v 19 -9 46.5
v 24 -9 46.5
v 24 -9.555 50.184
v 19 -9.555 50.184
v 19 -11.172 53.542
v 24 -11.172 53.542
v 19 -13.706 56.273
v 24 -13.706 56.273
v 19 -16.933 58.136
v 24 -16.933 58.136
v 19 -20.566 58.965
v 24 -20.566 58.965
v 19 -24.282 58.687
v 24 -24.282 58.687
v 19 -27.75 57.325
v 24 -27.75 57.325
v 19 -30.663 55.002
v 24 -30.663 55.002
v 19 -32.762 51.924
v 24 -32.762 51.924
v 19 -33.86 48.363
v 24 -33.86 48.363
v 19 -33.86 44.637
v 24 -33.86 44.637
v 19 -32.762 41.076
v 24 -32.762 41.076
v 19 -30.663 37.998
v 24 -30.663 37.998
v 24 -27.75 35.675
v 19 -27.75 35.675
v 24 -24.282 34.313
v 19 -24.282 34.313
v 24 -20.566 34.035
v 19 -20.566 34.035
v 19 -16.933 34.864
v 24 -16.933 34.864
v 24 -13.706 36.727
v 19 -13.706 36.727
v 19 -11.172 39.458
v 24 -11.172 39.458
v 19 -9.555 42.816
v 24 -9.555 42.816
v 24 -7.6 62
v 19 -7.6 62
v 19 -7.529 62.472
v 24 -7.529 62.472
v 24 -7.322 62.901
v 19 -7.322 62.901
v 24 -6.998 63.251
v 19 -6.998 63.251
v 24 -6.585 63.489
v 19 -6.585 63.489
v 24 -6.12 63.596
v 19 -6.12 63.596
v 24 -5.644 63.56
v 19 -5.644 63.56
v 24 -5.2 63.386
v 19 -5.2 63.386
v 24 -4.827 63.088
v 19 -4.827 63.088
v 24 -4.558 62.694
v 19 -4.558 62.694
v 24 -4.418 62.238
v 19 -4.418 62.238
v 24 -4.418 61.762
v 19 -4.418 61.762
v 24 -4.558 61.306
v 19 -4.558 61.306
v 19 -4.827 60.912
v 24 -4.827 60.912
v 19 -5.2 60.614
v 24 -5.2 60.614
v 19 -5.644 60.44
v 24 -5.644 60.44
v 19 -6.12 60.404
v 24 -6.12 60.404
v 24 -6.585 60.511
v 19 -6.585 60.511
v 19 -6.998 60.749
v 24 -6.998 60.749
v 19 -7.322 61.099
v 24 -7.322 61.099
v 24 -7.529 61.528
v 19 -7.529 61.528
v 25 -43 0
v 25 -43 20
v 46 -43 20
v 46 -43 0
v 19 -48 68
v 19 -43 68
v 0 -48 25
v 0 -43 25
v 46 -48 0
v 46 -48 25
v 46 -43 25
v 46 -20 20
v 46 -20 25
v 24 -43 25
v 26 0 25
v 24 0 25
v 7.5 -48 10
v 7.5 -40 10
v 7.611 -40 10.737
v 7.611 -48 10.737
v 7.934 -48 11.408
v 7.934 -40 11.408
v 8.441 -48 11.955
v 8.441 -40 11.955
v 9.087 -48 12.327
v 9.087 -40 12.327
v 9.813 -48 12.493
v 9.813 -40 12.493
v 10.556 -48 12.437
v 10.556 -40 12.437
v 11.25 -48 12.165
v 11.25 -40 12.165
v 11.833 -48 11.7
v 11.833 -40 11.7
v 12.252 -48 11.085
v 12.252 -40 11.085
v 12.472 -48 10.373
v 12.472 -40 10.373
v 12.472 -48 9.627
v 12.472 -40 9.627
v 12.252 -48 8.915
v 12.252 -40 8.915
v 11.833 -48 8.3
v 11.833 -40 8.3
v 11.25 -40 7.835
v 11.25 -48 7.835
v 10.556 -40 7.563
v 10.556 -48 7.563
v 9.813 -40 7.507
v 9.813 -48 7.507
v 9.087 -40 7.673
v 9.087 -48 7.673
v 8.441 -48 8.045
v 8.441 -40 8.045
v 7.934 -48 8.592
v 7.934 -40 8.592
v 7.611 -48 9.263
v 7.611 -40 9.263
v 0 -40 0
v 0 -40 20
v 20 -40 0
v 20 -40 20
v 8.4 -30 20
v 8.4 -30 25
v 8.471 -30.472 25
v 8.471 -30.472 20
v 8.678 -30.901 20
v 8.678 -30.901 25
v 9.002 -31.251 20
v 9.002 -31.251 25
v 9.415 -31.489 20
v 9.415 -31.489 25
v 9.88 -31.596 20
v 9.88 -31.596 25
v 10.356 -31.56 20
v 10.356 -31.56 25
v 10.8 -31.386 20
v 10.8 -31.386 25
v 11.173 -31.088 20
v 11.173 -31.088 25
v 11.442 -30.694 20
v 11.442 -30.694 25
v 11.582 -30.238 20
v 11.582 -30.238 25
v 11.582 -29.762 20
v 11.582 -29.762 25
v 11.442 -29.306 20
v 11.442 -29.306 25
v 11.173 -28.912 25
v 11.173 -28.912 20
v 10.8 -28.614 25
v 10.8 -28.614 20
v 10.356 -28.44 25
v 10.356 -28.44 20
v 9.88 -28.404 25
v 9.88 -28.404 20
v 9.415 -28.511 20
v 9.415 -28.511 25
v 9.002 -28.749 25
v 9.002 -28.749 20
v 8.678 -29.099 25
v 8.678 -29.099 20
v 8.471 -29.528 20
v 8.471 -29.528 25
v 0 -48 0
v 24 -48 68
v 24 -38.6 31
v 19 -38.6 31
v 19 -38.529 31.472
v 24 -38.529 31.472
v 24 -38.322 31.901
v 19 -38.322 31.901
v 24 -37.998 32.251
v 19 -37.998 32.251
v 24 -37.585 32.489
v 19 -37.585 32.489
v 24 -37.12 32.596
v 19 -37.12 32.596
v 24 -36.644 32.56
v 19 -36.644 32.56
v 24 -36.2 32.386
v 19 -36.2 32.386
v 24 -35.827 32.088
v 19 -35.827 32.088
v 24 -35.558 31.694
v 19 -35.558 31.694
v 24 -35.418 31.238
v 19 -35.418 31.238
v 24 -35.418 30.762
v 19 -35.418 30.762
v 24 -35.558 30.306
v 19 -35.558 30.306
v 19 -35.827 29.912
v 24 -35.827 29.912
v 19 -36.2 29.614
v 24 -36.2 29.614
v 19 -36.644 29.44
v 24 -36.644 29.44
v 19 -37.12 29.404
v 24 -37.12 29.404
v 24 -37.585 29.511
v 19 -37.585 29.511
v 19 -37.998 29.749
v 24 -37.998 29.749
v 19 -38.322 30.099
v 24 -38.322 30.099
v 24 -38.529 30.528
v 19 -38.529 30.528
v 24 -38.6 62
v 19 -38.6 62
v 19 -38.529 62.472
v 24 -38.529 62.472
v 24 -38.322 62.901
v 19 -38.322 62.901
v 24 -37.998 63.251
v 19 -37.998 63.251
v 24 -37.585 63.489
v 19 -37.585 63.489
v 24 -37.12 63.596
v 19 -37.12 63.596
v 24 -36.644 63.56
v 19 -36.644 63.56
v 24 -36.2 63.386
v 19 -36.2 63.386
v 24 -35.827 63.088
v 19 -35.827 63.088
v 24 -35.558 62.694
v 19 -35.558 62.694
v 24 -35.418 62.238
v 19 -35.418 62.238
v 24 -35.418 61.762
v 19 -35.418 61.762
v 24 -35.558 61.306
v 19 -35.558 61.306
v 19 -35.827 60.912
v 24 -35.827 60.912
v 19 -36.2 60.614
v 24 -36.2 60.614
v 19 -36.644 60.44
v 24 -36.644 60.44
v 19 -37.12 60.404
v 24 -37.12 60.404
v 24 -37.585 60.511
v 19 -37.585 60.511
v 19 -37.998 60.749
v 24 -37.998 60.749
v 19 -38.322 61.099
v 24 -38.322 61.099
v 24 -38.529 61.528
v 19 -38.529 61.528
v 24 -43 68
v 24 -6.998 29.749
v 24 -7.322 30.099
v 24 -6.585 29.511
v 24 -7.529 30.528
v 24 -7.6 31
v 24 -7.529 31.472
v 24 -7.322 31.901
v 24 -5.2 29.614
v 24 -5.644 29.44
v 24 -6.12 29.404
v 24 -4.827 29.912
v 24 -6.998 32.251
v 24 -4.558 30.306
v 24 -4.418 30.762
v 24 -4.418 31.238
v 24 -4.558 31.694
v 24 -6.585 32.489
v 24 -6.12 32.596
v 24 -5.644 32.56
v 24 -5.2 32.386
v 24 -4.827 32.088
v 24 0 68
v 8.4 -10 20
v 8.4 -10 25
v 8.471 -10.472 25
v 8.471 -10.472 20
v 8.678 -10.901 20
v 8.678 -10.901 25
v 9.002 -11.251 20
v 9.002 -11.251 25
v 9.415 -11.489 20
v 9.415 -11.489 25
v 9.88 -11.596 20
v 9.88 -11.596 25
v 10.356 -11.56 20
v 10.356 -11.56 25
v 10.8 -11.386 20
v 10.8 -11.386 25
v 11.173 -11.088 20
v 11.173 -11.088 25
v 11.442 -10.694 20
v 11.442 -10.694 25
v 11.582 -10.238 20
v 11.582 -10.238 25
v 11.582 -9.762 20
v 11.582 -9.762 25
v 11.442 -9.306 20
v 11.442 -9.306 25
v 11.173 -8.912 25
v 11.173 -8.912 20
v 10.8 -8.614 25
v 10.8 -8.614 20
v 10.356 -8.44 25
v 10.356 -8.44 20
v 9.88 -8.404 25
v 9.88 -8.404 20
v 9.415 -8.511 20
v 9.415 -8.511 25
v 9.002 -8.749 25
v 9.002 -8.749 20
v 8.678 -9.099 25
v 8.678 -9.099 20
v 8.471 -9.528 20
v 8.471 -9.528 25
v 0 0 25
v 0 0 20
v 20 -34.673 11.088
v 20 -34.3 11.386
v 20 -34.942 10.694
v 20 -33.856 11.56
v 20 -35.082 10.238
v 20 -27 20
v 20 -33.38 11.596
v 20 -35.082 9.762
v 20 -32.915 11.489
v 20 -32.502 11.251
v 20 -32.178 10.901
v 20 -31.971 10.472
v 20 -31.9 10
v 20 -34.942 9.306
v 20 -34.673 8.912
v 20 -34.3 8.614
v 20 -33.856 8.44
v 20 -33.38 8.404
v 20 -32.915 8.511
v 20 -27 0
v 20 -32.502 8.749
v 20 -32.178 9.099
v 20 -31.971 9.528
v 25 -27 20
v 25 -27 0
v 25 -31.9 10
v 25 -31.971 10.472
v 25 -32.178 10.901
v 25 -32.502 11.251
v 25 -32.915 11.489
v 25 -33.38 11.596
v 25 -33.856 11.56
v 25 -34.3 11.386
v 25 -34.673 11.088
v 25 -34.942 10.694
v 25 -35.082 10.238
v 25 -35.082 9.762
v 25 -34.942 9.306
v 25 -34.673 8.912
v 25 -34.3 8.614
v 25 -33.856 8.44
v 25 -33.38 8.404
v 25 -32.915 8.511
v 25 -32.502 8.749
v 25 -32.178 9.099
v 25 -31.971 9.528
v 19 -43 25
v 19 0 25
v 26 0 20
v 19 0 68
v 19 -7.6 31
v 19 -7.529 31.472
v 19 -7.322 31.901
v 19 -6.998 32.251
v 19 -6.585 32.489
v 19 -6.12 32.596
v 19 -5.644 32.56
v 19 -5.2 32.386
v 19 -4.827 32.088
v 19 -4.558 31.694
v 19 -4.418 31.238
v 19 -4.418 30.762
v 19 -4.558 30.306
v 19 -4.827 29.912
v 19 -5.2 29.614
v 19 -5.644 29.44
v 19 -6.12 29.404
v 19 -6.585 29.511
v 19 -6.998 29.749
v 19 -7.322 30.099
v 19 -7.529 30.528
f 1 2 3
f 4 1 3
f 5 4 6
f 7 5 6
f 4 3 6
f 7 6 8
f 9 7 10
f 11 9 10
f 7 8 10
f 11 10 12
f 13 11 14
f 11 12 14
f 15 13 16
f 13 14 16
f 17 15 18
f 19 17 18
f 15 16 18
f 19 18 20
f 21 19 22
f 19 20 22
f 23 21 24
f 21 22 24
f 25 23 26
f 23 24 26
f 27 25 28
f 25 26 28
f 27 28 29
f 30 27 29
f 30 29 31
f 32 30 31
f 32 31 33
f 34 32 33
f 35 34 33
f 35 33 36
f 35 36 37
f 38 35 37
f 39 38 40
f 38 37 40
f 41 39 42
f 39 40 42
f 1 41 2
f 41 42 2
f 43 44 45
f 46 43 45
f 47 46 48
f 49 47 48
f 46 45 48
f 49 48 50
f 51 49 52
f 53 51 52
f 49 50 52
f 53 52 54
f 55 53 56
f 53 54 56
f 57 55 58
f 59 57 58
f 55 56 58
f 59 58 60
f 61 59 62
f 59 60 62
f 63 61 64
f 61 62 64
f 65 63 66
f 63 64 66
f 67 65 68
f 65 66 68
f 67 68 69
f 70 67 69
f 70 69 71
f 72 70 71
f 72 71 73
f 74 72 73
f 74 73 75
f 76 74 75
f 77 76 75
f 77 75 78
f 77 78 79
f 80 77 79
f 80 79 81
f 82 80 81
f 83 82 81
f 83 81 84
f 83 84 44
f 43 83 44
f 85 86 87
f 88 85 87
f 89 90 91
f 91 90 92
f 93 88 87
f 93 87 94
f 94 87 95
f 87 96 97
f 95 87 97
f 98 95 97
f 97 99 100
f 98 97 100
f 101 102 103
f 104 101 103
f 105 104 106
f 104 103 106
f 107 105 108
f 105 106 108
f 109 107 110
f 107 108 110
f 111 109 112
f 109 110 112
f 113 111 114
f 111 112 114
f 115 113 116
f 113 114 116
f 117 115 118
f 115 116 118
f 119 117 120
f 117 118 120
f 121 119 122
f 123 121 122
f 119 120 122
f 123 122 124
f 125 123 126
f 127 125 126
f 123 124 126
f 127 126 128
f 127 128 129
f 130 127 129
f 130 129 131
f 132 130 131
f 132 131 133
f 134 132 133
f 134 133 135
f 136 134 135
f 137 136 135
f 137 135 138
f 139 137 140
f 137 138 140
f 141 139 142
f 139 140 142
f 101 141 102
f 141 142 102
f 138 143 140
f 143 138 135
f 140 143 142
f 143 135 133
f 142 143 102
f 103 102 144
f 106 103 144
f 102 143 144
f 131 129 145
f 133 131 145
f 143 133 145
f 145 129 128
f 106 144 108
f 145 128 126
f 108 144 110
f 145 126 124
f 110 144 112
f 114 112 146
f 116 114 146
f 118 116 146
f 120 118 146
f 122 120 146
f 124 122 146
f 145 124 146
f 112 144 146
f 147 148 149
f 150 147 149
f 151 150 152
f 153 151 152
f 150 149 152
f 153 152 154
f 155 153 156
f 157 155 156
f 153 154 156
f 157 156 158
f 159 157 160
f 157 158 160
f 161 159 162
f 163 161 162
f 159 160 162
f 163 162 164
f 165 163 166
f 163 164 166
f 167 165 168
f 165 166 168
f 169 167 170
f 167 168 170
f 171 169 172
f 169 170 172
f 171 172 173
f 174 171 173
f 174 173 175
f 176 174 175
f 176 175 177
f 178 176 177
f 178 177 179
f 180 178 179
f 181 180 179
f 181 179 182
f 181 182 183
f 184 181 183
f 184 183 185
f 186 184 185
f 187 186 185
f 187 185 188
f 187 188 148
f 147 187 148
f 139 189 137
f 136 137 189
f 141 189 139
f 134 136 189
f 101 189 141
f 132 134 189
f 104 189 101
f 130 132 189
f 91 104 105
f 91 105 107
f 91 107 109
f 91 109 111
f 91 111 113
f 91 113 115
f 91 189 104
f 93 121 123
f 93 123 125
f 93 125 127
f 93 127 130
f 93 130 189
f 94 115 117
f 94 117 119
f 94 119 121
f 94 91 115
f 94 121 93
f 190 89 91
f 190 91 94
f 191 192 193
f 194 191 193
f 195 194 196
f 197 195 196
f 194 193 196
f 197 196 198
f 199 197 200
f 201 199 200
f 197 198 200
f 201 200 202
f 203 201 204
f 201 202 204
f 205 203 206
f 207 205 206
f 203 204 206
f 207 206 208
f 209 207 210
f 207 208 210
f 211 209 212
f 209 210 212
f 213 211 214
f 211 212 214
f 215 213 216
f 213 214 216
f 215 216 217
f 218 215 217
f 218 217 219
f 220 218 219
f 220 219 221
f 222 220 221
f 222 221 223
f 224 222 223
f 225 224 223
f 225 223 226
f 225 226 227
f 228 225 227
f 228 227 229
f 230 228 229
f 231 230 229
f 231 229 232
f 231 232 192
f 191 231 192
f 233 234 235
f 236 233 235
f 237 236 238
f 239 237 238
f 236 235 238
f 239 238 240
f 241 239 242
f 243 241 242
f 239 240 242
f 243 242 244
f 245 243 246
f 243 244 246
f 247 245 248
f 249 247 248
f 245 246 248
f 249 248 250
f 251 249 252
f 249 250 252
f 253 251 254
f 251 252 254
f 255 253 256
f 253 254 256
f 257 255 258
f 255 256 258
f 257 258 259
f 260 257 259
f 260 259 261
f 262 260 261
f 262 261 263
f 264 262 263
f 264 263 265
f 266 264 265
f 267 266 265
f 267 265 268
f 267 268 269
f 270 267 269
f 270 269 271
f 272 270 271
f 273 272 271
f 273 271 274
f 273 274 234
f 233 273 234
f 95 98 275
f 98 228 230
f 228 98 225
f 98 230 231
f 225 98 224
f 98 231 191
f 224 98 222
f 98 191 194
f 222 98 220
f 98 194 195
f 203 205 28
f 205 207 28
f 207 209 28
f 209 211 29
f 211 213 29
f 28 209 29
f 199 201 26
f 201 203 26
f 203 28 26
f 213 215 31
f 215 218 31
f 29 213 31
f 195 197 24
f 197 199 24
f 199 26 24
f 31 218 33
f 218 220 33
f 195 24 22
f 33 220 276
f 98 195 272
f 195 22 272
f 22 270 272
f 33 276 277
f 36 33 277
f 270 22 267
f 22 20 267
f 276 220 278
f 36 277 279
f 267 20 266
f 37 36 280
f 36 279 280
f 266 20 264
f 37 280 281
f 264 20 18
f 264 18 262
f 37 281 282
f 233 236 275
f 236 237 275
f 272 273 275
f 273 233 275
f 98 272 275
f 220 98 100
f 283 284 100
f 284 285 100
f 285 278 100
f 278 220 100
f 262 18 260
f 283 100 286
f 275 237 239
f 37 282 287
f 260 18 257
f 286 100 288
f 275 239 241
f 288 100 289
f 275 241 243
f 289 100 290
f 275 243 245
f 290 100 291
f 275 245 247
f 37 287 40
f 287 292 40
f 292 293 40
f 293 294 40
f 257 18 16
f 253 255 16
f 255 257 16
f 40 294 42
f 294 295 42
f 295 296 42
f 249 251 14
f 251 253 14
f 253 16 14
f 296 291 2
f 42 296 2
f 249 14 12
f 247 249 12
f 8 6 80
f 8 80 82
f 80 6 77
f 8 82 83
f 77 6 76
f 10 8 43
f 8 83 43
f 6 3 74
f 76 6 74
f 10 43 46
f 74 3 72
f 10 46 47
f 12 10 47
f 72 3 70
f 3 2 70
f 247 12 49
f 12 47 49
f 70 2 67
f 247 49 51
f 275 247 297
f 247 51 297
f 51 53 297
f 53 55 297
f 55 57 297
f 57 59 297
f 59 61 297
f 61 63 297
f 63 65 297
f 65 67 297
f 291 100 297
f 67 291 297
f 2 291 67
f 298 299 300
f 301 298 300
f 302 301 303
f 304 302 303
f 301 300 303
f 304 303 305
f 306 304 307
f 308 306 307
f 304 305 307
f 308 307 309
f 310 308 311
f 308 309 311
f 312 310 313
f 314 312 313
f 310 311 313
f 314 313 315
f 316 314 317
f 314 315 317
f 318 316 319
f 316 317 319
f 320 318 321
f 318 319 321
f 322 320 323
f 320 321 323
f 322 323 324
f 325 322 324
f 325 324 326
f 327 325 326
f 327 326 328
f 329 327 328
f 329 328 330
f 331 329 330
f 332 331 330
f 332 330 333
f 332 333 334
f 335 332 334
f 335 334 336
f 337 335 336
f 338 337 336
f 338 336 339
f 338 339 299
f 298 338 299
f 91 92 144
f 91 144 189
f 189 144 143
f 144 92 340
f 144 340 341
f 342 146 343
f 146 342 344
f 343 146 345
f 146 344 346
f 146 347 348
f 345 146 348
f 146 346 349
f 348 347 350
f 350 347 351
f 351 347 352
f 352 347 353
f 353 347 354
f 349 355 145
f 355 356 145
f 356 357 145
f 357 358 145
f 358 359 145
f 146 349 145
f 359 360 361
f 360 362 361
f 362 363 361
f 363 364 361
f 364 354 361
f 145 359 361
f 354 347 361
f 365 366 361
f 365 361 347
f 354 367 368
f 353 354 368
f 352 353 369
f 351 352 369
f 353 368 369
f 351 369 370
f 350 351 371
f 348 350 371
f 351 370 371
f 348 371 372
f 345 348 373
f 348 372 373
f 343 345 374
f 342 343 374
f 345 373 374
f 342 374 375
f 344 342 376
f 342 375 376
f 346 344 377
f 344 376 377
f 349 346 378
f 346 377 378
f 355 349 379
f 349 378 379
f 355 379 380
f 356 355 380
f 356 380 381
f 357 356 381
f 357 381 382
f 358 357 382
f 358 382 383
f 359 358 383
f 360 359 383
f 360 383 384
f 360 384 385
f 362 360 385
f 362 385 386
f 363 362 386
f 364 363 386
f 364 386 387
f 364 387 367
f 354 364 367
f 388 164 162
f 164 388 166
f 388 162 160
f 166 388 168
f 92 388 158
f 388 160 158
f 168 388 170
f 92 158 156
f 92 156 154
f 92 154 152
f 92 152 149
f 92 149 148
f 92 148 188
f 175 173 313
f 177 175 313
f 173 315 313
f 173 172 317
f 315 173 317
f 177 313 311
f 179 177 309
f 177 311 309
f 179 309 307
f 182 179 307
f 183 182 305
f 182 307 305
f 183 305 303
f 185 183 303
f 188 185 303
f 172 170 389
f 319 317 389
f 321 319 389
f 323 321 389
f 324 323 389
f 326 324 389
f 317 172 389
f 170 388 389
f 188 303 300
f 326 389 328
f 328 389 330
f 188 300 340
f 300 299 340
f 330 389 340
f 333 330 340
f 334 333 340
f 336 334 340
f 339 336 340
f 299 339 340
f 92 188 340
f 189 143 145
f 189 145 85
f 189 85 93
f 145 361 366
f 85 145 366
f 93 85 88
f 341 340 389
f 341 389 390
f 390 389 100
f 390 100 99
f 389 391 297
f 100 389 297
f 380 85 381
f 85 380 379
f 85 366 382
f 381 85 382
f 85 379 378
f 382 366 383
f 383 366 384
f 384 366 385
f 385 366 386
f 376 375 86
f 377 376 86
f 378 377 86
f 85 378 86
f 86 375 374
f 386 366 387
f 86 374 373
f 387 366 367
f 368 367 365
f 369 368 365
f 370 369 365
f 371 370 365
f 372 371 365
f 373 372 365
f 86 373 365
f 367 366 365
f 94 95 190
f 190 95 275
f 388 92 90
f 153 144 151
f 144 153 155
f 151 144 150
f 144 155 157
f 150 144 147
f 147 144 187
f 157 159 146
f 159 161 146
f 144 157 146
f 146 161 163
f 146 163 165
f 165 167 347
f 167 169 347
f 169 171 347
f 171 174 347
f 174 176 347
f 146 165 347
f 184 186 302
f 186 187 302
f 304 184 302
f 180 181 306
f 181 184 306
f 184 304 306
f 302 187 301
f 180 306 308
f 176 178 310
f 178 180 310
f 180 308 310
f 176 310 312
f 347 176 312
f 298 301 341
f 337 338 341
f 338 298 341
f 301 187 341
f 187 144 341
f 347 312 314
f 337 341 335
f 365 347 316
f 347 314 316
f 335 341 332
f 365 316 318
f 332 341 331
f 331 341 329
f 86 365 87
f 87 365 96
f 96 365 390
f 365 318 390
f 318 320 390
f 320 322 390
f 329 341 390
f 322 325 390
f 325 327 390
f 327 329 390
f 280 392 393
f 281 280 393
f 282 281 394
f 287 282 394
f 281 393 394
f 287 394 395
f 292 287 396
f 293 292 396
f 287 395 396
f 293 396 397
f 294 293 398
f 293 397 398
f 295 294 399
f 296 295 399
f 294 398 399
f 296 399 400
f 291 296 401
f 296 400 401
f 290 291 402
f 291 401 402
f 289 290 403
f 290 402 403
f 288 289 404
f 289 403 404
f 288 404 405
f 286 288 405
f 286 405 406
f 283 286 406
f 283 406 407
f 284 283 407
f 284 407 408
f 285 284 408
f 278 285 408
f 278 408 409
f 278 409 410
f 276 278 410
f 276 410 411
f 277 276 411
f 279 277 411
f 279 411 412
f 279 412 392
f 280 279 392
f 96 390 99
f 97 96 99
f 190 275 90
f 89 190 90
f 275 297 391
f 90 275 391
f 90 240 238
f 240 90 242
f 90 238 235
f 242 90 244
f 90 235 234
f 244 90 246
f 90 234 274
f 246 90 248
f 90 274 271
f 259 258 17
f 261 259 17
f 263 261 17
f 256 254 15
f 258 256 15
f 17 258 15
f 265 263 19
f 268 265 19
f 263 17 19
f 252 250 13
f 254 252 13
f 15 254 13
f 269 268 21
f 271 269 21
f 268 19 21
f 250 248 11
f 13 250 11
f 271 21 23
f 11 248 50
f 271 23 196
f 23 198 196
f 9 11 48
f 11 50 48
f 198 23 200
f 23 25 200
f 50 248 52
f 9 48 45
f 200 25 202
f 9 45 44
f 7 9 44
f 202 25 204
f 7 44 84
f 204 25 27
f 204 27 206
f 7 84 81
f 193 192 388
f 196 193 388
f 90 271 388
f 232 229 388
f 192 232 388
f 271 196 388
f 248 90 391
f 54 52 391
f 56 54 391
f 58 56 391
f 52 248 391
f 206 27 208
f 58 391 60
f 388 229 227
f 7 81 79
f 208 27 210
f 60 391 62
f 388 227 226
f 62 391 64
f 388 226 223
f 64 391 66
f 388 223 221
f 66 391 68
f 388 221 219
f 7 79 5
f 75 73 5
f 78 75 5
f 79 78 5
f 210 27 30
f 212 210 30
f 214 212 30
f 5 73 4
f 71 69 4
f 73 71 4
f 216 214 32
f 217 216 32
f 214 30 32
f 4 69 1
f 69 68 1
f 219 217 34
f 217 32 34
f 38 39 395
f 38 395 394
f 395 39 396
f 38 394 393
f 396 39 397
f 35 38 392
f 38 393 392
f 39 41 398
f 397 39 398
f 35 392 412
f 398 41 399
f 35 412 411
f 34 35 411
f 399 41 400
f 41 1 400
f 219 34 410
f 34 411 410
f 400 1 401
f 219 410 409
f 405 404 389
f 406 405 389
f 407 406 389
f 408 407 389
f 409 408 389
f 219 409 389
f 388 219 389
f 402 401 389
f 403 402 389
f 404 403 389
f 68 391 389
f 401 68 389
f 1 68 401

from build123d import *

# Parameters (mm, degrees)
F1_DEPTH     = 43
F2_W         = 20
F2_H         = 20
F3_DEPTH     = 3
F4_W         = 27
F4_H         = 20
F5_DEPTH     = 5
F7_R         = 12.5
F8_DEPTH     = 5
F11_D        = 3.2
F11_ON_F9_D  = 3.2
F11_ON_F10_D = 3.2
F12_W        = 21
F12_H        = 20
F13_DEPTH    = 5
F14_SIZE     = 20
F15_R        = 2.5
F16_DEPTH    = 8


with BuildPart() as f1:
    # F0 (on Front) → F1 (new body)
    with BuildSketch(Plane.XZ):
        Polygon((0, 25), (0, 20), (20, 20), (20, 0), (25, 0), (25, 20), (46, 20), (46, 25), (24, 25), (24, 68), (19, 68), (19, 25), align=None)
    extrude(amount=F1_DEPTH)

    # F2 (on face) → F3 (join)
    with BuildSketch(Plane.XZ.offset(43)):
        with Locations((10, 10)):
            Rectangle(F2_W, F2_H)
    extrude(amount=-F3_DEPTH)

    # F4 (on face) → F5 (cut, through all)
    with BuildSketch(Plane.YZ.offset(25)):
        with Locations((-13.5, 10)):
            Rectangle(F4_W, F4_H)
    extrude(amount=-F5_DEPTH, mode=Mode.SUBTRACT)

    # F7 (on face) → F8 (cut, through all)
    with BuildSketch(Plane.YZ.offset(24)):
        with Locations((-21.5, 46.5)):
            Circle(F7_R)
    extrude(amount=-F8_DEPTH, mode=Mode.SUBTRACT)

    # F11 (through all)
    with Locations(Plane.YZ.offset(24)):
        with Locations((-37, 62), (-6, 62), (-37, 31), (-6, 31)):
            Hole(F11_D / 2)

    # F11 on F9 (through all)
    with Locations(Plane(origin=(0, 0, 20), x_dir=(1, 0, 0), z_dir=(0, 0, -1))):
        with Locations((10, 10), (10, 30)):
            Hole(F11_ON_F9_D / 2)

    # F11 on F10 (through all)
    with Locations(Plane(origin=(20, 0, 0), x_dir=(0, -1, 0), z_dir=(-1, 0, 0))):
        with Locations((33.5, 10)):
            Hole(F11_ON_F10_D / 2)

    # F12 (on face) → F13 (join)
    with BuildSketch(Plane.XZ.offset(43)):
        Polygon((19, 68), (0, 25), (19, 25), align=None)
        Polygon((19, 25), (0, 25), (0, 0), (25, 0), (25, 20), (46, 20), (46, 25), (24, 25), (24, 68), (19, 68), align=None)
        Polygon((46, 25), (24, 68), (24, 25), align=None)
        with Locations((35.5, 10)):
            Rectangle(F12_W, F12_H)
    extrude(amount=F13_DEPTH)

    # F14
    f14_edges = [f1.edges().sort_by_distance(p)[0] for p in [
        (46, 0, 22.5),
    ]]
    chamfer(f14_edges, length=F14_SIZE)

    # F15 (on face) → F16 (cut, through all)
    with BuildSketch(Plane(origin=(0, -40, 0), x_dir=(-1, 0, 0), z_dir=(0, 1, 0))):
        with Locations((-10, 10)):
            Circle(F15_R)
    extrude(amount=-F16_DEPTH, mode=Mode.SUBTRACT)


solid = f1.part
